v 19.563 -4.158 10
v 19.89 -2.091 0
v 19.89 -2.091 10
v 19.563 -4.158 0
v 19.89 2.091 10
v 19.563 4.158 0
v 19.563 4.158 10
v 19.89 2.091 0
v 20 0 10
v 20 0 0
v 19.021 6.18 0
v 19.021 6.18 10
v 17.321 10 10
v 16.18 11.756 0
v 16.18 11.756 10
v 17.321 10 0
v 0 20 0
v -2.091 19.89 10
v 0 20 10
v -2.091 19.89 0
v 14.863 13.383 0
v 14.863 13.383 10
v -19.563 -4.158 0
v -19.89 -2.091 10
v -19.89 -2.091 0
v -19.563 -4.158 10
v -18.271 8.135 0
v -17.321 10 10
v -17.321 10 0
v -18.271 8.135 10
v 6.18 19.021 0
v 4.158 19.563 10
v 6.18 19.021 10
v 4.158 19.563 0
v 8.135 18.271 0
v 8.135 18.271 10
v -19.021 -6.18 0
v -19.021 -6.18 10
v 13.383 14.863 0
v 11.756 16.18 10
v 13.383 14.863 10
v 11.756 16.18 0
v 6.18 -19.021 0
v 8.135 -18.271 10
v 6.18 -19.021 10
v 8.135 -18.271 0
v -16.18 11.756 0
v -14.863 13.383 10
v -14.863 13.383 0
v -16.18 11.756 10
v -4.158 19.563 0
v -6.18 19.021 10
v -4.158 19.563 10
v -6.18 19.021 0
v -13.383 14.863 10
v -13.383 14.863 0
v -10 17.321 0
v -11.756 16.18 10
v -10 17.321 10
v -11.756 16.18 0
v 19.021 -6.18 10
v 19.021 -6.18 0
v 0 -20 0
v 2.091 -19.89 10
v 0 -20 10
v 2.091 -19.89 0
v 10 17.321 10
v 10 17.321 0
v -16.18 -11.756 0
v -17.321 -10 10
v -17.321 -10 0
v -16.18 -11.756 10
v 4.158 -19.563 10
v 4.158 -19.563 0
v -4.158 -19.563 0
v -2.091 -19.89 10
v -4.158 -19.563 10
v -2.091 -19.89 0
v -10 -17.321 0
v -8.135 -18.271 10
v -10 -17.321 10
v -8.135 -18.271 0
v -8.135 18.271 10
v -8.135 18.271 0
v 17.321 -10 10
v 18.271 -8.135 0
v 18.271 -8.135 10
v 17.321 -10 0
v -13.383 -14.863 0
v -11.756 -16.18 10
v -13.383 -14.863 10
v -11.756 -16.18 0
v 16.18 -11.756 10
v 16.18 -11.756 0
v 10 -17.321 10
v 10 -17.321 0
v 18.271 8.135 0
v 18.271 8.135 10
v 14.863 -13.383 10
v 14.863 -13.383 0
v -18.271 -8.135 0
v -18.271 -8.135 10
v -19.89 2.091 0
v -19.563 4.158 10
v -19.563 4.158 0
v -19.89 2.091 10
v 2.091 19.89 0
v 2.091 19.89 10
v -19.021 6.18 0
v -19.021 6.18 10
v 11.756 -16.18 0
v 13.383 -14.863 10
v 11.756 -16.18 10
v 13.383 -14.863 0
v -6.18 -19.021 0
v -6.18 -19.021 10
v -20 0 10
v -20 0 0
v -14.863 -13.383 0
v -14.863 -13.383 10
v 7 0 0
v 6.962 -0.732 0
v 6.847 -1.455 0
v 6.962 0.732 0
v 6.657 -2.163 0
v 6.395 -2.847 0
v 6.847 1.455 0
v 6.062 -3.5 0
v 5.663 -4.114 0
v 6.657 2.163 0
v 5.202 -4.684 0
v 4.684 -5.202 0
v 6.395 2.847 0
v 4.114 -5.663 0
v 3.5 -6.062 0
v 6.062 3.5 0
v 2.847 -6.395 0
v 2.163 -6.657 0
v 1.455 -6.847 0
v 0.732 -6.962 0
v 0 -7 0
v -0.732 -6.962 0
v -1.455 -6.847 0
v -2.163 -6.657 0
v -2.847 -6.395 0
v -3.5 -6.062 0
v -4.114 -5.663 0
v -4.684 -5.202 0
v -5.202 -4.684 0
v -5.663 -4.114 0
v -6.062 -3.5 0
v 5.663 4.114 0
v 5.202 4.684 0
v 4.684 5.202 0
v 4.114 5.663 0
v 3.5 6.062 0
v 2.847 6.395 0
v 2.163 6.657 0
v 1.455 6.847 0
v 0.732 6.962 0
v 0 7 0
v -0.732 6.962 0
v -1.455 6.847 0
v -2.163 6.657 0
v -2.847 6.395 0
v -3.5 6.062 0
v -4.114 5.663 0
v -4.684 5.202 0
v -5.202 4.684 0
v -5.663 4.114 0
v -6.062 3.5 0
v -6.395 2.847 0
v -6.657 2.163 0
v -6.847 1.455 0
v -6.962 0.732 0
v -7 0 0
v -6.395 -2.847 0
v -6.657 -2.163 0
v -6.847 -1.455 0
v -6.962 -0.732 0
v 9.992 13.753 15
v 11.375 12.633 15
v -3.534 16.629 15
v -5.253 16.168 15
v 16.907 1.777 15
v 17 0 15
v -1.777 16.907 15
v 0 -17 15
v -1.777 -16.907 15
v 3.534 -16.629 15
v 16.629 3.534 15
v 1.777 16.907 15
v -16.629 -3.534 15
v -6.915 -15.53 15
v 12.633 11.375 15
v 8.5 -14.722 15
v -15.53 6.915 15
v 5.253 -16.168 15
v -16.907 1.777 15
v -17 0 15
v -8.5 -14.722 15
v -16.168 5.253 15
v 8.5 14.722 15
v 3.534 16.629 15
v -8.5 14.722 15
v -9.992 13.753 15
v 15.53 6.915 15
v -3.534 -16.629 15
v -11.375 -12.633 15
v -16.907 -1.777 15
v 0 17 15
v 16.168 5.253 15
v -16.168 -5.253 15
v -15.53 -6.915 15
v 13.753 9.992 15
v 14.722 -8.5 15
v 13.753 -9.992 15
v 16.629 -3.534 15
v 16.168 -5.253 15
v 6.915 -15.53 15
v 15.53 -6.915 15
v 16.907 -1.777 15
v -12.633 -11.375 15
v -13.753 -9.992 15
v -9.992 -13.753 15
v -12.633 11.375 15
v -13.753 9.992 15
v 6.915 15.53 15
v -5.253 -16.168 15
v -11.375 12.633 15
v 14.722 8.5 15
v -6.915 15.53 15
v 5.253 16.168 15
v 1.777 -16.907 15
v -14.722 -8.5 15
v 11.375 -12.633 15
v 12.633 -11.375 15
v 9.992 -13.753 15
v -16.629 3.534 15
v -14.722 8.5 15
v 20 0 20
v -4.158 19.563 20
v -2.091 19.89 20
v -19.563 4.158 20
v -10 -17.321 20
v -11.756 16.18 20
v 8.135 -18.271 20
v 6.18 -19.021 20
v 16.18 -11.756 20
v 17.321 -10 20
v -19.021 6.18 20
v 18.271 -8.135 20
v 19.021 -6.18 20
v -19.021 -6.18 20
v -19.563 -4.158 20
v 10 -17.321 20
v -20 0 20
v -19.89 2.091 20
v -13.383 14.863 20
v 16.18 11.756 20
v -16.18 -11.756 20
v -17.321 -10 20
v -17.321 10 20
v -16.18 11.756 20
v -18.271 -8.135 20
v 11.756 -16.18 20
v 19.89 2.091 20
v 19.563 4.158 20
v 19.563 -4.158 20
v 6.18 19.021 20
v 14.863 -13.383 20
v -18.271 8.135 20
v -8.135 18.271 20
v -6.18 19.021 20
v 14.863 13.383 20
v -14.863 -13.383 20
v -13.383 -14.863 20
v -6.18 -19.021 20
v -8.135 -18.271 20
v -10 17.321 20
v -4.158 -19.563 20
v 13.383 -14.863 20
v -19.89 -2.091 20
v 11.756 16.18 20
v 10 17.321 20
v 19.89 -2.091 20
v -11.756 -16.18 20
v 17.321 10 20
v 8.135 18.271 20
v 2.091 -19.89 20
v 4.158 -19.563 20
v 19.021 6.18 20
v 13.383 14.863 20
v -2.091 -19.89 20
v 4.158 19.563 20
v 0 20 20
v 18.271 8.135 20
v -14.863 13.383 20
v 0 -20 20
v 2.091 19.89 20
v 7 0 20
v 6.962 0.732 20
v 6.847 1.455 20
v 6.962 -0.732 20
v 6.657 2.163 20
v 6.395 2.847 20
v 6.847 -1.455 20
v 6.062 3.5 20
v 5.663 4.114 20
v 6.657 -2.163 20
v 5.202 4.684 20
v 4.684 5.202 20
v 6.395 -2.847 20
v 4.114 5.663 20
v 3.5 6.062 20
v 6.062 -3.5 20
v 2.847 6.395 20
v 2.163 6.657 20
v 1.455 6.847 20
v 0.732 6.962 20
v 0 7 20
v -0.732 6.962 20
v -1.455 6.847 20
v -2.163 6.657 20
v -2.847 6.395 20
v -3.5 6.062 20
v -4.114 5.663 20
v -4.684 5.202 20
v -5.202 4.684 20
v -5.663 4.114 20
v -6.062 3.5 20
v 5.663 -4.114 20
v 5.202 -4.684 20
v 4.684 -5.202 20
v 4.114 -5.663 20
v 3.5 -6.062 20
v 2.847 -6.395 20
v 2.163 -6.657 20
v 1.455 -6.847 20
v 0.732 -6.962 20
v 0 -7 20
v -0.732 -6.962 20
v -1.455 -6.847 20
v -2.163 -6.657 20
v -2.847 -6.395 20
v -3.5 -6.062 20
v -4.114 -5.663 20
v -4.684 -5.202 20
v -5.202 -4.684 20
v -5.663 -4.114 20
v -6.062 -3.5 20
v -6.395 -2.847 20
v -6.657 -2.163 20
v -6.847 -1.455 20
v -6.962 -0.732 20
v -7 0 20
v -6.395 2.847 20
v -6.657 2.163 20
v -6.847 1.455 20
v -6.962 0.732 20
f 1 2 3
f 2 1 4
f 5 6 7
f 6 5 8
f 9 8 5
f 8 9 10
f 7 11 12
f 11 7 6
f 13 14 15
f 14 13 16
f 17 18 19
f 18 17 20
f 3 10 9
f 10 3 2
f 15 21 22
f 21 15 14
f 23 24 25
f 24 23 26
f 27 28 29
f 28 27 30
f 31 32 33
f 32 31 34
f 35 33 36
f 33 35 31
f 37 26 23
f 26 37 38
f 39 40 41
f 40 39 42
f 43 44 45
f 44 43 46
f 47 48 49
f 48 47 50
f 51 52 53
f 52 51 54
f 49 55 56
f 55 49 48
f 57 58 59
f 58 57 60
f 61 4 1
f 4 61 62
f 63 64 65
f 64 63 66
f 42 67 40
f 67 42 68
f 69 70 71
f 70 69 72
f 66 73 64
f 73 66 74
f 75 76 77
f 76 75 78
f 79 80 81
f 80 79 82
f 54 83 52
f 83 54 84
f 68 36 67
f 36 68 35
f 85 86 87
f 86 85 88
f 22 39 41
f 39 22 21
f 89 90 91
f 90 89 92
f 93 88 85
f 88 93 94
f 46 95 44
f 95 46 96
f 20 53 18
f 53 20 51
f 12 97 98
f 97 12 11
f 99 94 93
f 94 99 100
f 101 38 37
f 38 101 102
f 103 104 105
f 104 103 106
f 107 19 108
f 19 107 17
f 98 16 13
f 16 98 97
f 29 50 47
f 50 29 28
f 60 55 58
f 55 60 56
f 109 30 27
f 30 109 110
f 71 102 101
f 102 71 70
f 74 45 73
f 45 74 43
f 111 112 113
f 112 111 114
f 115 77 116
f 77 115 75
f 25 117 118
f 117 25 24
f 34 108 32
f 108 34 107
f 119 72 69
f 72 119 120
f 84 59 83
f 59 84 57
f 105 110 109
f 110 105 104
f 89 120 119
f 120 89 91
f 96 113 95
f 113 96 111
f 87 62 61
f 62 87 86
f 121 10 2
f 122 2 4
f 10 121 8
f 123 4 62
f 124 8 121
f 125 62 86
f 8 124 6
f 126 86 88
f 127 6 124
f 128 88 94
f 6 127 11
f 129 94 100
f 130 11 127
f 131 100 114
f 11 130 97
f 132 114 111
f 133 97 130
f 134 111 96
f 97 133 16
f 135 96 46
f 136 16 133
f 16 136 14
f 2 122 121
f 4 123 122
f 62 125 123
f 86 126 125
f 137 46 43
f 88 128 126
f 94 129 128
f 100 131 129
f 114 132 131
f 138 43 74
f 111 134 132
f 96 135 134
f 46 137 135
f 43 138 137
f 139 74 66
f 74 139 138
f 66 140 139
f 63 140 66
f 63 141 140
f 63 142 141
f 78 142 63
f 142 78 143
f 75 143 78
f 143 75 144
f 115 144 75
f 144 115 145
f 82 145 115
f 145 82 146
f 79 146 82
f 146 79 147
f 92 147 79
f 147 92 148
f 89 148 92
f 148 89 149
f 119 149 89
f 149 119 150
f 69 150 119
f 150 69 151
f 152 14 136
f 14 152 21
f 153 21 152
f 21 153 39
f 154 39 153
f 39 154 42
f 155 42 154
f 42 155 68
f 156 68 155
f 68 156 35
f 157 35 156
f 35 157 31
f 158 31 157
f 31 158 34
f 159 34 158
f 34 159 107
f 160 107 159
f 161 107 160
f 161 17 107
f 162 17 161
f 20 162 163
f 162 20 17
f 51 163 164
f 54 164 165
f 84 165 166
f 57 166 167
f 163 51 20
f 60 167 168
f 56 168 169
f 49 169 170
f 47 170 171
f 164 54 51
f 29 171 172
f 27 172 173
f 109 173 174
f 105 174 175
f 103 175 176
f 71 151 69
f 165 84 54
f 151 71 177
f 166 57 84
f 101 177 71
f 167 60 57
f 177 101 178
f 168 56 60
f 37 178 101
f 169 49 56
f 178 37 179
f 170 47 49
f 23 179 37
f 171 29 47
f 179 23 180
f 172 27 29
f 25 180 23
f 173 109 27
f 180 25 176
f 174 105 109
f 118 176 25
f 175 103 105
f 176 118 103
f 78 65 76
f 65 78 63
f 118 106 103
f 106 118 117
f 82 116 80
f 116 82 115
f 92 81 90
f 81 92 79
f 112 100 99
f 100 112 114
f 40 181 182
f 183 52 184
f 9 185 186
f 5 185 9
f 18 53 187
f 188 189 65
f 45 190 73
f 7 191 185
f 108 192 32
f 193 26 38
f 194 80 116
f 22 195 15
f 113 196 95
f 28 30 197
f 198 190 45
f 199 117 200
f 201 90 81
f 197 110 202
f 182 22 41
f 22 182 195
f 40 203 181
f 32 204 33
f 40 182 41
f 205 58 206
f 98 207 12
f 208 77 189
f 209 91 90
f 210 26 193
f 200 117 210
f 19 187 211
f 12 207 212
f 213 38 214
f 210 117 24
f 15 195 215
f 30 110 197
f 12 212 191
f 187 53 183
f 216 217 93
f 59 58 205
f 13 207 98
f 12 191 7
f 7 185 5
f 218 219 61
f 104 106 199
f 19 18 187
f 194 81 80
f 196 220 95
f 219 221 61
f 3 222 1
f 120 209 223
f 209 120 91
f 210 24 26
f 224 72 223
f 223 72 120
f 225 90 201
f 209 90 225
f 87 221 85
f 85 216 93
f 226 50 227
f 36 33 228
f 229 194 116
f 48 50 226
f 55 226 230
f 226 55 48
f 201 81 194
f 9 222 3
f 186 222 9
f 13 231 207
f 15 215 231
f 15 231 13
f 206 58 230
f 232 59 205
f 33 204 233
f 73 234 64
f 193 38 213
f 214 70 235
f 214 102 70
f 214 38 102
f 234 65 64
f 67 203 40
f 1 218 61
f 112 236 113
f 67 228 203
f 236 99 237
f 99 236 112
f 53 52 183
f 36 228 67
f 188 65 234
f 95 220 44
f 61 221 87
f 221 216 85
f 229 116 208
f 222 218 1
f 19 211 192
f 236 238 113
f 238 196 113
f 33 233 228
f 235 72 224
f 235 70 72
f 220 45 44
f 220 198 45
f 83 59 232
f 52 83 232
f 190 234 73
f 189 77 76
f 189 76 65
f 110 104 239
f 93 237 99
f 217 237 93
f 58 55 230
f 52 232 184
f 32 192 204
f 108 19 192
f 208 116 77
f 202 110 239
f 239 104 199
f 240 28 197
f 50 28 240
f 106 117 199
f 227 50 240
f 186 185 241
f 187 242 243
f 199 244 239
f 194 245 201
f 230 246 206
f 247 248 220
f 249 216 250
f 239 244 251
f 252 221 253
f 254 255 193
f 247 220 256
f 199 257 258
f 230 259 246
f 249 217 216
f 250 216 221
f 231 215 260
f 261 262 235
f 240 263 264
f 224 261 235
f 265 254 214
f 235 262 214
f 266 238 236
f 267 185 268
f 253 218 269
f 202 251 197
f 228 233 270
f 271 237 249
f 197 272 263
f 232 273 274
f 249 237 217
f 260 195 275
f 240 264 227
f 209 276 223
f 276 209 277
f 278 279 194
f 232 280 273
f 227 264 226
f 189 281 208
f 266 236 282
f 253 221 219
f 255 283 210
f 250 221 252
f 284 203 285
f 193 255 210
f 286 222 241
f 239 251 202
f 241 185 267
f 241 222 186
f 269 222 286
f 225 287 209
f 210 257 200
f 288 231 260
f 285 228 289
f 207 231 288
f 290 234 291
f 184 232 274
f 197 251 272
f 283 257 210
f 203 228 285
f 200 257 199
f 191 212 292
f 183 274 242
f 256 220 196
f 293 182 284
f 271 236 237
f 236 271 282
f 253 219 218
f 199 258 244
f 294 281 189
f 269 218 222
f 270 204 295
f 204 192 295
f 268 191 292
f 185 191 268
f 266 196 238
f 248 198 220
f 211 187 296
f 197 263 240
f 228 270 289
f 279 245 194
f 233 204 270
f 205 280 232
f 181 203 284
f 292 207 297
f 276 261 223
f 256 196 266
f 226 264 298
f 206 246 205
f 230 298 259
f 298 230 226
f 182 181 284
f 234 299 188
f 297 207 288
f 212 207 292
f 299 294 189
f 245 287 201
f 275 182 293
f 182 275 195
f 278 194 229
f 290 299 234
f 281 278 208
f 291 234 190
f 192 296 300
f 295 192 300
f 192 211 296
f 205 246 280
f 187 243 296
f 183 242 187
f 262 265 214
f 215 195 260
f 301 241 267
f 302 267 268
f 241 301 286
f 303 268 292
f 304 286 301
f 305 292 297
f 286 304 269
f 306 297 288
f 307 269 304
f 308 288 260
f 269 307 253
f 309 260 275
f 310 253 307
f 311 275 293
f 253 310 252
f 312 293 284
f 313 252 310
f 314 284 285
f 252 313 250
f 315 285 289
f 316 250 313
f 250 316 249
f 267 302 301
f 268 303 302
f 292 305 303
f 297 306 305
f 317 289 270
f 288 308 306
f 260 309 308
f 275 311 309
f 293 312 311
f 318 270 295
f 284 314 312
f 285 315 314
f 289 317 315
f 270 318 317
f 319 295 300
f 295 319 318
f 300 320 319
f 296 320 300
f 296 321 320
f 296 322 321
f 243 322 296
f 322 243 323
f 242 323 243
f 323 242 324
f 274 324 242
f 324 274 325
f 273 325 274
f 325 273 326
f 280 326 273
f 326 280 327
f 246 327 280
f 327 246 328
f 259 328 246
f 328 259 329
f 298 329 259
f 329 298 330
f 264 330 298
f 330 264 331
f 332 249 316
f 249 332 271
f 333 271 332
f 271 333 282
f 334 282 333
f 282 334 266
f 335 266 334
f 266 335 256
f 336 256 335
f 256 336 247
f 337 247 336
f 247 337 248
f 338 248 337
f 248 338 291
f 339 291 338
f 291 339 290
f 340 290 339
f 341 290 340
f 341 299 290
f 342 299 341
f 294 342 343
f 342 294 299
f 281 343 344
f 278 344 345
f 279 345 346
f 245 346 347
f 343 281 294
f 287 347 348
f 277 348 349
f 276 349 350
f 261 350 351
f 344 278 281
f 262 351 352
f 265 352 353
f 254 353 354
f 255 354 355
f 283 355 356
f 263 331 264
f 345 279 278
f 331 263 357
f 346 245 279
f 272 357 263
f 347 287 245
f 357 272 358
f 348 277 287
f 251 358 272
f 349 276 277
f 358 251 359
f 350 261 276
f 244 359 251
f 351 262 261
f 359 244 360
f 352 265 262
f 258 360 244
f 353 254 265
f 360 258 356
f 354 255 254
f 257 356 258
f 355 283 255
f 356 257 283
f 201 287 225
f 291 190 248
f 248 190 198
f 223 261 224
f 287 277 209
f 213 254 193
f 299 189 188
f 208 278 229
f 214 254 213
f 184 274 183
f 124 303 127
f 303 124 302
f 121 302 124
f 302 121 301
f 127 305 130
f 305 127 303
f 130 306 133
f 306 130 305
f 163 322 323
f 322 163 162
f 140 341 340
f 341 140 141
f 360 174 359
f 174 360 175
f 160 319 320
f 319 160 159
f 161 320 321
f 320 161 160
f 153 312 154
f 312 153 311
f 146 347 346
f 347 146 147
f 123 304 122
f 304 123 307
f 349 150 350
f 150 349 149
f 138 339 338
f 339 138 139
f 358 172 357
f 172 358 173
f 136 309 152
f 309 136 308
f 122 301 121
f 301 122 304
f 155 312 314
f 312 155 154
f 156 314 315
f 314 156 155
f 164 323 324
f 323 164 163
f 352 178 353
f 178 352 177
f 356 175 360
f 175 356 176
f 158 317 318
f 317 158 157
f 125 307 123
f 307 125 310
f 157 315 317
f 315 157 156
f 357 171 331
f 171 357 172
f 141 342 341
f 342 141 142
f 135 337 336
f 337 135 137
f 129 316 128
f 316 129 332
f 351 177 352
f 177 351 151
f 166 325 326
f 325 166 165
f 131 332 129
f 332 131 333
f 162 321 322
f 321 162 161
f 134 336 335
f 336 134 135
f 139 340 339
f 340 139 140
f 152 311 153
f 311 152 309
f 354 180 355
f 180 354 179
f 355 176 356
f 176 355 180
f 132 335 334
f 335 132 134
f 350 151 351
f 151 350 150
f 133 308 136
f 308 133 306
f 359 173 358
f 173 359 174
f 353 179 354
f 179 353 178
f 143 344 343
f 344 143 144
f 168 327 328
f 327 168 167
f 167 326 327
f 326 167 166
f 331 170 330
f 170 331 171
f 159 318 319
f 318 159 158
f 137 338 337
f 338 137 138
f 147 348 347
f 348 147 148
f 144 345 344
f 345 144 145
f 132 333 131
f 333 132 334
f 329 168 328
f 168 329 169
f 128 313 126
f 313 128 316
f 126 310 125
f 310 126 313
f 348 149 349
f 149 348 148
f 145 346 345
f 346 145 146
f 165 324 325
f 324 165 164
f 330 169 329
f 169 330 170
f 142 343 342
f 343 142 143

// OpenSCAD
// V-groove guide wheel.
$fn = 60;
eps = 0.02;
bore_d = 14;
outer_d = 40;
width = 20;
groove_d = outer_d-6;
difference() {
    union() { cylinder(d=outer_d,h=width/2); translate([0,0,width/2]) cylinder(d1=outer_d,d2=groove_d,h=width/4); translate([0,0,3*width/4]) cylinder(d1=groove_d,d2=outer_d,h=width/4); }
    translate([0,0,-eps]) cylinder(d=bore_d,h=width+2*eps);
}
